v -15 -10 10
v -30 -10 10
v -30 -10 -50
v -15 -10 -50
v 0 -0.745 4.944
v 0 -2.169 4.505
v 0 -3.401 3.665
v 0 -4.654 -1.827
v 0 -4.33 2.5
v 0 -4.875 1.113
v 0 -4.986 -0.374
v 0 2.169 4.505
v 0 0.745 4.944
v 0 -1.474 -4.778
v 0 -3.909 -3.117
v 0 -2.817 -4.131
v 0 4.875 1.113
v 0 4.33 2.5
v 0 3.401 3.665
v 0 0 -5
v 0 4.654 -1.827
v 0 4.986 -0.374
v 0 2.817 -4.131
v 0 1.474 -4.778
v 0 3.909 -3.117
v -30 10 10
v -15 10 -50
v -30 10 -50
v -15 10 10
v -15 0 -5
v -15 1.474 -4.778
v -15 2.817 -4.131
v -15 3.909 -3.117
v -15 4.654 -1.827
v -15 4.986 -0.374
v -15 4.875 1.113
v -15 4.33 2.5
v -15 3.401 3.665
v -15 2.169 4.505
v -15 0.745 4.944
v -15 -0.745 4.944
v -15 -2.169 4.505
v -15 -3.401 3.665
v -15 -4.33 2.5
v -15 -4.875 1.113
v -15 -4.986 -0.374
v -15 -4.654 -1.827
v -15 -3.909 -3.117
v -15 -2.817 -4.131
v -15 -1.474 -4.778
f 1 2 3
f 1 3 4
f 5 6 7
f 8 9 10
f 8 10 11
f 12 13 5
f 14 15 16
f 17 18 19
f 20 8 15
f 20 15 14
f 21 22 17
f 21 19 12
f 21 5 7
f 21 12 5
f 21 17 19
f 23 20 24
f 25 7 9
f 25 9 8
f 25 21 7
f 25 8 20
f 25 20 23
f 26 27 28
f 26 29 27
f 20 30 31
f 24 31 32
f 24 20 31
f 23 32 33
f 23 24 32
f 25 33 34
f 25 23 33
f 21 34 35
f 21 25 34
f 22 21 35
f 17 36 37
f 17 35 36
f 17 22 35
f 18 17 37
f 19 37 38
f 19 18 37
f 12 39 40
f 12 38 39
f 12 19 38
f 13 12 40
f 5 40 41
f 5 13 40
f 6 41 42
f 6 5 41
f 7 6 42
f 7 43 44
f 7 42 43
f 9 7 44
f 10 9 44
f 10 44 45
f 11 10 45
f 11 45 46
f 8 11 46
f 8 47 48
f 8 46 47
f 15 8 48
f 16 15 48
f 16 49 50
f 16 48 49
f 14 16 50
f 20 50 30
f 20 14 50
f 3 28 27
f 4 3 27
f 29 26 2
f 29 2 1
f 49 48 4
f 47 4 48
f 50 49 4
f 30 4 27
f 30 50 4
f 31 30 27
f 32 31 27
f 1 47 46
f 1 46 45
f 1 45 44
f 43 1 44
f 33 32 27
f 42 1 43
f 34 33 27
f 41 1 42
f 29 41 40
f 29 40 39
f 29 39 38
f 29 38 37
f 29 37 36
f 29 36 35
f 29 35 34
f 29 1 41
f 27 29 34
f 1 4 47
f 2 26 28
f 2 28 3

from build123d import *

# Parameters (mm, degrees)
SKETCH2_R                = 5
BOSS_EXTRUDE1_DEPTH      = 15
BOSS_EXTRUDE2_DEPTH      = 10
BOSS_EXTRUDE2_DEPTH_BACK = 50


with BuildPart() as part:
    # Sketch2 → Boss-Extrude1 (new body)
    with BuildSketch(Plane(origin=(0, 0, 0), x_dir=(0, 0, -1), z_dir=(1, 0, 0))):
        Circle(SKETCH2_R)
    extrude(amount=-BOSS_EXTRUDE1_DEPTH)

    # Sketch3 → Boss-Extrude2 (add, two sides)
    with BuildSketch(Plane.XY) as boss_extrude2_sk:
        Polygon((-15, 0), (-15, 10), (-30, 10), (-30, -10), (-15, -10), align=None)
    extrude(amount=BOSS_EXTRUDE2_DEPTH)
    extrude(boss_extrude2_sk.sketch, amount=-BOSS_EXTRUDE2_DEPTH_BACK)


solid = part.part
